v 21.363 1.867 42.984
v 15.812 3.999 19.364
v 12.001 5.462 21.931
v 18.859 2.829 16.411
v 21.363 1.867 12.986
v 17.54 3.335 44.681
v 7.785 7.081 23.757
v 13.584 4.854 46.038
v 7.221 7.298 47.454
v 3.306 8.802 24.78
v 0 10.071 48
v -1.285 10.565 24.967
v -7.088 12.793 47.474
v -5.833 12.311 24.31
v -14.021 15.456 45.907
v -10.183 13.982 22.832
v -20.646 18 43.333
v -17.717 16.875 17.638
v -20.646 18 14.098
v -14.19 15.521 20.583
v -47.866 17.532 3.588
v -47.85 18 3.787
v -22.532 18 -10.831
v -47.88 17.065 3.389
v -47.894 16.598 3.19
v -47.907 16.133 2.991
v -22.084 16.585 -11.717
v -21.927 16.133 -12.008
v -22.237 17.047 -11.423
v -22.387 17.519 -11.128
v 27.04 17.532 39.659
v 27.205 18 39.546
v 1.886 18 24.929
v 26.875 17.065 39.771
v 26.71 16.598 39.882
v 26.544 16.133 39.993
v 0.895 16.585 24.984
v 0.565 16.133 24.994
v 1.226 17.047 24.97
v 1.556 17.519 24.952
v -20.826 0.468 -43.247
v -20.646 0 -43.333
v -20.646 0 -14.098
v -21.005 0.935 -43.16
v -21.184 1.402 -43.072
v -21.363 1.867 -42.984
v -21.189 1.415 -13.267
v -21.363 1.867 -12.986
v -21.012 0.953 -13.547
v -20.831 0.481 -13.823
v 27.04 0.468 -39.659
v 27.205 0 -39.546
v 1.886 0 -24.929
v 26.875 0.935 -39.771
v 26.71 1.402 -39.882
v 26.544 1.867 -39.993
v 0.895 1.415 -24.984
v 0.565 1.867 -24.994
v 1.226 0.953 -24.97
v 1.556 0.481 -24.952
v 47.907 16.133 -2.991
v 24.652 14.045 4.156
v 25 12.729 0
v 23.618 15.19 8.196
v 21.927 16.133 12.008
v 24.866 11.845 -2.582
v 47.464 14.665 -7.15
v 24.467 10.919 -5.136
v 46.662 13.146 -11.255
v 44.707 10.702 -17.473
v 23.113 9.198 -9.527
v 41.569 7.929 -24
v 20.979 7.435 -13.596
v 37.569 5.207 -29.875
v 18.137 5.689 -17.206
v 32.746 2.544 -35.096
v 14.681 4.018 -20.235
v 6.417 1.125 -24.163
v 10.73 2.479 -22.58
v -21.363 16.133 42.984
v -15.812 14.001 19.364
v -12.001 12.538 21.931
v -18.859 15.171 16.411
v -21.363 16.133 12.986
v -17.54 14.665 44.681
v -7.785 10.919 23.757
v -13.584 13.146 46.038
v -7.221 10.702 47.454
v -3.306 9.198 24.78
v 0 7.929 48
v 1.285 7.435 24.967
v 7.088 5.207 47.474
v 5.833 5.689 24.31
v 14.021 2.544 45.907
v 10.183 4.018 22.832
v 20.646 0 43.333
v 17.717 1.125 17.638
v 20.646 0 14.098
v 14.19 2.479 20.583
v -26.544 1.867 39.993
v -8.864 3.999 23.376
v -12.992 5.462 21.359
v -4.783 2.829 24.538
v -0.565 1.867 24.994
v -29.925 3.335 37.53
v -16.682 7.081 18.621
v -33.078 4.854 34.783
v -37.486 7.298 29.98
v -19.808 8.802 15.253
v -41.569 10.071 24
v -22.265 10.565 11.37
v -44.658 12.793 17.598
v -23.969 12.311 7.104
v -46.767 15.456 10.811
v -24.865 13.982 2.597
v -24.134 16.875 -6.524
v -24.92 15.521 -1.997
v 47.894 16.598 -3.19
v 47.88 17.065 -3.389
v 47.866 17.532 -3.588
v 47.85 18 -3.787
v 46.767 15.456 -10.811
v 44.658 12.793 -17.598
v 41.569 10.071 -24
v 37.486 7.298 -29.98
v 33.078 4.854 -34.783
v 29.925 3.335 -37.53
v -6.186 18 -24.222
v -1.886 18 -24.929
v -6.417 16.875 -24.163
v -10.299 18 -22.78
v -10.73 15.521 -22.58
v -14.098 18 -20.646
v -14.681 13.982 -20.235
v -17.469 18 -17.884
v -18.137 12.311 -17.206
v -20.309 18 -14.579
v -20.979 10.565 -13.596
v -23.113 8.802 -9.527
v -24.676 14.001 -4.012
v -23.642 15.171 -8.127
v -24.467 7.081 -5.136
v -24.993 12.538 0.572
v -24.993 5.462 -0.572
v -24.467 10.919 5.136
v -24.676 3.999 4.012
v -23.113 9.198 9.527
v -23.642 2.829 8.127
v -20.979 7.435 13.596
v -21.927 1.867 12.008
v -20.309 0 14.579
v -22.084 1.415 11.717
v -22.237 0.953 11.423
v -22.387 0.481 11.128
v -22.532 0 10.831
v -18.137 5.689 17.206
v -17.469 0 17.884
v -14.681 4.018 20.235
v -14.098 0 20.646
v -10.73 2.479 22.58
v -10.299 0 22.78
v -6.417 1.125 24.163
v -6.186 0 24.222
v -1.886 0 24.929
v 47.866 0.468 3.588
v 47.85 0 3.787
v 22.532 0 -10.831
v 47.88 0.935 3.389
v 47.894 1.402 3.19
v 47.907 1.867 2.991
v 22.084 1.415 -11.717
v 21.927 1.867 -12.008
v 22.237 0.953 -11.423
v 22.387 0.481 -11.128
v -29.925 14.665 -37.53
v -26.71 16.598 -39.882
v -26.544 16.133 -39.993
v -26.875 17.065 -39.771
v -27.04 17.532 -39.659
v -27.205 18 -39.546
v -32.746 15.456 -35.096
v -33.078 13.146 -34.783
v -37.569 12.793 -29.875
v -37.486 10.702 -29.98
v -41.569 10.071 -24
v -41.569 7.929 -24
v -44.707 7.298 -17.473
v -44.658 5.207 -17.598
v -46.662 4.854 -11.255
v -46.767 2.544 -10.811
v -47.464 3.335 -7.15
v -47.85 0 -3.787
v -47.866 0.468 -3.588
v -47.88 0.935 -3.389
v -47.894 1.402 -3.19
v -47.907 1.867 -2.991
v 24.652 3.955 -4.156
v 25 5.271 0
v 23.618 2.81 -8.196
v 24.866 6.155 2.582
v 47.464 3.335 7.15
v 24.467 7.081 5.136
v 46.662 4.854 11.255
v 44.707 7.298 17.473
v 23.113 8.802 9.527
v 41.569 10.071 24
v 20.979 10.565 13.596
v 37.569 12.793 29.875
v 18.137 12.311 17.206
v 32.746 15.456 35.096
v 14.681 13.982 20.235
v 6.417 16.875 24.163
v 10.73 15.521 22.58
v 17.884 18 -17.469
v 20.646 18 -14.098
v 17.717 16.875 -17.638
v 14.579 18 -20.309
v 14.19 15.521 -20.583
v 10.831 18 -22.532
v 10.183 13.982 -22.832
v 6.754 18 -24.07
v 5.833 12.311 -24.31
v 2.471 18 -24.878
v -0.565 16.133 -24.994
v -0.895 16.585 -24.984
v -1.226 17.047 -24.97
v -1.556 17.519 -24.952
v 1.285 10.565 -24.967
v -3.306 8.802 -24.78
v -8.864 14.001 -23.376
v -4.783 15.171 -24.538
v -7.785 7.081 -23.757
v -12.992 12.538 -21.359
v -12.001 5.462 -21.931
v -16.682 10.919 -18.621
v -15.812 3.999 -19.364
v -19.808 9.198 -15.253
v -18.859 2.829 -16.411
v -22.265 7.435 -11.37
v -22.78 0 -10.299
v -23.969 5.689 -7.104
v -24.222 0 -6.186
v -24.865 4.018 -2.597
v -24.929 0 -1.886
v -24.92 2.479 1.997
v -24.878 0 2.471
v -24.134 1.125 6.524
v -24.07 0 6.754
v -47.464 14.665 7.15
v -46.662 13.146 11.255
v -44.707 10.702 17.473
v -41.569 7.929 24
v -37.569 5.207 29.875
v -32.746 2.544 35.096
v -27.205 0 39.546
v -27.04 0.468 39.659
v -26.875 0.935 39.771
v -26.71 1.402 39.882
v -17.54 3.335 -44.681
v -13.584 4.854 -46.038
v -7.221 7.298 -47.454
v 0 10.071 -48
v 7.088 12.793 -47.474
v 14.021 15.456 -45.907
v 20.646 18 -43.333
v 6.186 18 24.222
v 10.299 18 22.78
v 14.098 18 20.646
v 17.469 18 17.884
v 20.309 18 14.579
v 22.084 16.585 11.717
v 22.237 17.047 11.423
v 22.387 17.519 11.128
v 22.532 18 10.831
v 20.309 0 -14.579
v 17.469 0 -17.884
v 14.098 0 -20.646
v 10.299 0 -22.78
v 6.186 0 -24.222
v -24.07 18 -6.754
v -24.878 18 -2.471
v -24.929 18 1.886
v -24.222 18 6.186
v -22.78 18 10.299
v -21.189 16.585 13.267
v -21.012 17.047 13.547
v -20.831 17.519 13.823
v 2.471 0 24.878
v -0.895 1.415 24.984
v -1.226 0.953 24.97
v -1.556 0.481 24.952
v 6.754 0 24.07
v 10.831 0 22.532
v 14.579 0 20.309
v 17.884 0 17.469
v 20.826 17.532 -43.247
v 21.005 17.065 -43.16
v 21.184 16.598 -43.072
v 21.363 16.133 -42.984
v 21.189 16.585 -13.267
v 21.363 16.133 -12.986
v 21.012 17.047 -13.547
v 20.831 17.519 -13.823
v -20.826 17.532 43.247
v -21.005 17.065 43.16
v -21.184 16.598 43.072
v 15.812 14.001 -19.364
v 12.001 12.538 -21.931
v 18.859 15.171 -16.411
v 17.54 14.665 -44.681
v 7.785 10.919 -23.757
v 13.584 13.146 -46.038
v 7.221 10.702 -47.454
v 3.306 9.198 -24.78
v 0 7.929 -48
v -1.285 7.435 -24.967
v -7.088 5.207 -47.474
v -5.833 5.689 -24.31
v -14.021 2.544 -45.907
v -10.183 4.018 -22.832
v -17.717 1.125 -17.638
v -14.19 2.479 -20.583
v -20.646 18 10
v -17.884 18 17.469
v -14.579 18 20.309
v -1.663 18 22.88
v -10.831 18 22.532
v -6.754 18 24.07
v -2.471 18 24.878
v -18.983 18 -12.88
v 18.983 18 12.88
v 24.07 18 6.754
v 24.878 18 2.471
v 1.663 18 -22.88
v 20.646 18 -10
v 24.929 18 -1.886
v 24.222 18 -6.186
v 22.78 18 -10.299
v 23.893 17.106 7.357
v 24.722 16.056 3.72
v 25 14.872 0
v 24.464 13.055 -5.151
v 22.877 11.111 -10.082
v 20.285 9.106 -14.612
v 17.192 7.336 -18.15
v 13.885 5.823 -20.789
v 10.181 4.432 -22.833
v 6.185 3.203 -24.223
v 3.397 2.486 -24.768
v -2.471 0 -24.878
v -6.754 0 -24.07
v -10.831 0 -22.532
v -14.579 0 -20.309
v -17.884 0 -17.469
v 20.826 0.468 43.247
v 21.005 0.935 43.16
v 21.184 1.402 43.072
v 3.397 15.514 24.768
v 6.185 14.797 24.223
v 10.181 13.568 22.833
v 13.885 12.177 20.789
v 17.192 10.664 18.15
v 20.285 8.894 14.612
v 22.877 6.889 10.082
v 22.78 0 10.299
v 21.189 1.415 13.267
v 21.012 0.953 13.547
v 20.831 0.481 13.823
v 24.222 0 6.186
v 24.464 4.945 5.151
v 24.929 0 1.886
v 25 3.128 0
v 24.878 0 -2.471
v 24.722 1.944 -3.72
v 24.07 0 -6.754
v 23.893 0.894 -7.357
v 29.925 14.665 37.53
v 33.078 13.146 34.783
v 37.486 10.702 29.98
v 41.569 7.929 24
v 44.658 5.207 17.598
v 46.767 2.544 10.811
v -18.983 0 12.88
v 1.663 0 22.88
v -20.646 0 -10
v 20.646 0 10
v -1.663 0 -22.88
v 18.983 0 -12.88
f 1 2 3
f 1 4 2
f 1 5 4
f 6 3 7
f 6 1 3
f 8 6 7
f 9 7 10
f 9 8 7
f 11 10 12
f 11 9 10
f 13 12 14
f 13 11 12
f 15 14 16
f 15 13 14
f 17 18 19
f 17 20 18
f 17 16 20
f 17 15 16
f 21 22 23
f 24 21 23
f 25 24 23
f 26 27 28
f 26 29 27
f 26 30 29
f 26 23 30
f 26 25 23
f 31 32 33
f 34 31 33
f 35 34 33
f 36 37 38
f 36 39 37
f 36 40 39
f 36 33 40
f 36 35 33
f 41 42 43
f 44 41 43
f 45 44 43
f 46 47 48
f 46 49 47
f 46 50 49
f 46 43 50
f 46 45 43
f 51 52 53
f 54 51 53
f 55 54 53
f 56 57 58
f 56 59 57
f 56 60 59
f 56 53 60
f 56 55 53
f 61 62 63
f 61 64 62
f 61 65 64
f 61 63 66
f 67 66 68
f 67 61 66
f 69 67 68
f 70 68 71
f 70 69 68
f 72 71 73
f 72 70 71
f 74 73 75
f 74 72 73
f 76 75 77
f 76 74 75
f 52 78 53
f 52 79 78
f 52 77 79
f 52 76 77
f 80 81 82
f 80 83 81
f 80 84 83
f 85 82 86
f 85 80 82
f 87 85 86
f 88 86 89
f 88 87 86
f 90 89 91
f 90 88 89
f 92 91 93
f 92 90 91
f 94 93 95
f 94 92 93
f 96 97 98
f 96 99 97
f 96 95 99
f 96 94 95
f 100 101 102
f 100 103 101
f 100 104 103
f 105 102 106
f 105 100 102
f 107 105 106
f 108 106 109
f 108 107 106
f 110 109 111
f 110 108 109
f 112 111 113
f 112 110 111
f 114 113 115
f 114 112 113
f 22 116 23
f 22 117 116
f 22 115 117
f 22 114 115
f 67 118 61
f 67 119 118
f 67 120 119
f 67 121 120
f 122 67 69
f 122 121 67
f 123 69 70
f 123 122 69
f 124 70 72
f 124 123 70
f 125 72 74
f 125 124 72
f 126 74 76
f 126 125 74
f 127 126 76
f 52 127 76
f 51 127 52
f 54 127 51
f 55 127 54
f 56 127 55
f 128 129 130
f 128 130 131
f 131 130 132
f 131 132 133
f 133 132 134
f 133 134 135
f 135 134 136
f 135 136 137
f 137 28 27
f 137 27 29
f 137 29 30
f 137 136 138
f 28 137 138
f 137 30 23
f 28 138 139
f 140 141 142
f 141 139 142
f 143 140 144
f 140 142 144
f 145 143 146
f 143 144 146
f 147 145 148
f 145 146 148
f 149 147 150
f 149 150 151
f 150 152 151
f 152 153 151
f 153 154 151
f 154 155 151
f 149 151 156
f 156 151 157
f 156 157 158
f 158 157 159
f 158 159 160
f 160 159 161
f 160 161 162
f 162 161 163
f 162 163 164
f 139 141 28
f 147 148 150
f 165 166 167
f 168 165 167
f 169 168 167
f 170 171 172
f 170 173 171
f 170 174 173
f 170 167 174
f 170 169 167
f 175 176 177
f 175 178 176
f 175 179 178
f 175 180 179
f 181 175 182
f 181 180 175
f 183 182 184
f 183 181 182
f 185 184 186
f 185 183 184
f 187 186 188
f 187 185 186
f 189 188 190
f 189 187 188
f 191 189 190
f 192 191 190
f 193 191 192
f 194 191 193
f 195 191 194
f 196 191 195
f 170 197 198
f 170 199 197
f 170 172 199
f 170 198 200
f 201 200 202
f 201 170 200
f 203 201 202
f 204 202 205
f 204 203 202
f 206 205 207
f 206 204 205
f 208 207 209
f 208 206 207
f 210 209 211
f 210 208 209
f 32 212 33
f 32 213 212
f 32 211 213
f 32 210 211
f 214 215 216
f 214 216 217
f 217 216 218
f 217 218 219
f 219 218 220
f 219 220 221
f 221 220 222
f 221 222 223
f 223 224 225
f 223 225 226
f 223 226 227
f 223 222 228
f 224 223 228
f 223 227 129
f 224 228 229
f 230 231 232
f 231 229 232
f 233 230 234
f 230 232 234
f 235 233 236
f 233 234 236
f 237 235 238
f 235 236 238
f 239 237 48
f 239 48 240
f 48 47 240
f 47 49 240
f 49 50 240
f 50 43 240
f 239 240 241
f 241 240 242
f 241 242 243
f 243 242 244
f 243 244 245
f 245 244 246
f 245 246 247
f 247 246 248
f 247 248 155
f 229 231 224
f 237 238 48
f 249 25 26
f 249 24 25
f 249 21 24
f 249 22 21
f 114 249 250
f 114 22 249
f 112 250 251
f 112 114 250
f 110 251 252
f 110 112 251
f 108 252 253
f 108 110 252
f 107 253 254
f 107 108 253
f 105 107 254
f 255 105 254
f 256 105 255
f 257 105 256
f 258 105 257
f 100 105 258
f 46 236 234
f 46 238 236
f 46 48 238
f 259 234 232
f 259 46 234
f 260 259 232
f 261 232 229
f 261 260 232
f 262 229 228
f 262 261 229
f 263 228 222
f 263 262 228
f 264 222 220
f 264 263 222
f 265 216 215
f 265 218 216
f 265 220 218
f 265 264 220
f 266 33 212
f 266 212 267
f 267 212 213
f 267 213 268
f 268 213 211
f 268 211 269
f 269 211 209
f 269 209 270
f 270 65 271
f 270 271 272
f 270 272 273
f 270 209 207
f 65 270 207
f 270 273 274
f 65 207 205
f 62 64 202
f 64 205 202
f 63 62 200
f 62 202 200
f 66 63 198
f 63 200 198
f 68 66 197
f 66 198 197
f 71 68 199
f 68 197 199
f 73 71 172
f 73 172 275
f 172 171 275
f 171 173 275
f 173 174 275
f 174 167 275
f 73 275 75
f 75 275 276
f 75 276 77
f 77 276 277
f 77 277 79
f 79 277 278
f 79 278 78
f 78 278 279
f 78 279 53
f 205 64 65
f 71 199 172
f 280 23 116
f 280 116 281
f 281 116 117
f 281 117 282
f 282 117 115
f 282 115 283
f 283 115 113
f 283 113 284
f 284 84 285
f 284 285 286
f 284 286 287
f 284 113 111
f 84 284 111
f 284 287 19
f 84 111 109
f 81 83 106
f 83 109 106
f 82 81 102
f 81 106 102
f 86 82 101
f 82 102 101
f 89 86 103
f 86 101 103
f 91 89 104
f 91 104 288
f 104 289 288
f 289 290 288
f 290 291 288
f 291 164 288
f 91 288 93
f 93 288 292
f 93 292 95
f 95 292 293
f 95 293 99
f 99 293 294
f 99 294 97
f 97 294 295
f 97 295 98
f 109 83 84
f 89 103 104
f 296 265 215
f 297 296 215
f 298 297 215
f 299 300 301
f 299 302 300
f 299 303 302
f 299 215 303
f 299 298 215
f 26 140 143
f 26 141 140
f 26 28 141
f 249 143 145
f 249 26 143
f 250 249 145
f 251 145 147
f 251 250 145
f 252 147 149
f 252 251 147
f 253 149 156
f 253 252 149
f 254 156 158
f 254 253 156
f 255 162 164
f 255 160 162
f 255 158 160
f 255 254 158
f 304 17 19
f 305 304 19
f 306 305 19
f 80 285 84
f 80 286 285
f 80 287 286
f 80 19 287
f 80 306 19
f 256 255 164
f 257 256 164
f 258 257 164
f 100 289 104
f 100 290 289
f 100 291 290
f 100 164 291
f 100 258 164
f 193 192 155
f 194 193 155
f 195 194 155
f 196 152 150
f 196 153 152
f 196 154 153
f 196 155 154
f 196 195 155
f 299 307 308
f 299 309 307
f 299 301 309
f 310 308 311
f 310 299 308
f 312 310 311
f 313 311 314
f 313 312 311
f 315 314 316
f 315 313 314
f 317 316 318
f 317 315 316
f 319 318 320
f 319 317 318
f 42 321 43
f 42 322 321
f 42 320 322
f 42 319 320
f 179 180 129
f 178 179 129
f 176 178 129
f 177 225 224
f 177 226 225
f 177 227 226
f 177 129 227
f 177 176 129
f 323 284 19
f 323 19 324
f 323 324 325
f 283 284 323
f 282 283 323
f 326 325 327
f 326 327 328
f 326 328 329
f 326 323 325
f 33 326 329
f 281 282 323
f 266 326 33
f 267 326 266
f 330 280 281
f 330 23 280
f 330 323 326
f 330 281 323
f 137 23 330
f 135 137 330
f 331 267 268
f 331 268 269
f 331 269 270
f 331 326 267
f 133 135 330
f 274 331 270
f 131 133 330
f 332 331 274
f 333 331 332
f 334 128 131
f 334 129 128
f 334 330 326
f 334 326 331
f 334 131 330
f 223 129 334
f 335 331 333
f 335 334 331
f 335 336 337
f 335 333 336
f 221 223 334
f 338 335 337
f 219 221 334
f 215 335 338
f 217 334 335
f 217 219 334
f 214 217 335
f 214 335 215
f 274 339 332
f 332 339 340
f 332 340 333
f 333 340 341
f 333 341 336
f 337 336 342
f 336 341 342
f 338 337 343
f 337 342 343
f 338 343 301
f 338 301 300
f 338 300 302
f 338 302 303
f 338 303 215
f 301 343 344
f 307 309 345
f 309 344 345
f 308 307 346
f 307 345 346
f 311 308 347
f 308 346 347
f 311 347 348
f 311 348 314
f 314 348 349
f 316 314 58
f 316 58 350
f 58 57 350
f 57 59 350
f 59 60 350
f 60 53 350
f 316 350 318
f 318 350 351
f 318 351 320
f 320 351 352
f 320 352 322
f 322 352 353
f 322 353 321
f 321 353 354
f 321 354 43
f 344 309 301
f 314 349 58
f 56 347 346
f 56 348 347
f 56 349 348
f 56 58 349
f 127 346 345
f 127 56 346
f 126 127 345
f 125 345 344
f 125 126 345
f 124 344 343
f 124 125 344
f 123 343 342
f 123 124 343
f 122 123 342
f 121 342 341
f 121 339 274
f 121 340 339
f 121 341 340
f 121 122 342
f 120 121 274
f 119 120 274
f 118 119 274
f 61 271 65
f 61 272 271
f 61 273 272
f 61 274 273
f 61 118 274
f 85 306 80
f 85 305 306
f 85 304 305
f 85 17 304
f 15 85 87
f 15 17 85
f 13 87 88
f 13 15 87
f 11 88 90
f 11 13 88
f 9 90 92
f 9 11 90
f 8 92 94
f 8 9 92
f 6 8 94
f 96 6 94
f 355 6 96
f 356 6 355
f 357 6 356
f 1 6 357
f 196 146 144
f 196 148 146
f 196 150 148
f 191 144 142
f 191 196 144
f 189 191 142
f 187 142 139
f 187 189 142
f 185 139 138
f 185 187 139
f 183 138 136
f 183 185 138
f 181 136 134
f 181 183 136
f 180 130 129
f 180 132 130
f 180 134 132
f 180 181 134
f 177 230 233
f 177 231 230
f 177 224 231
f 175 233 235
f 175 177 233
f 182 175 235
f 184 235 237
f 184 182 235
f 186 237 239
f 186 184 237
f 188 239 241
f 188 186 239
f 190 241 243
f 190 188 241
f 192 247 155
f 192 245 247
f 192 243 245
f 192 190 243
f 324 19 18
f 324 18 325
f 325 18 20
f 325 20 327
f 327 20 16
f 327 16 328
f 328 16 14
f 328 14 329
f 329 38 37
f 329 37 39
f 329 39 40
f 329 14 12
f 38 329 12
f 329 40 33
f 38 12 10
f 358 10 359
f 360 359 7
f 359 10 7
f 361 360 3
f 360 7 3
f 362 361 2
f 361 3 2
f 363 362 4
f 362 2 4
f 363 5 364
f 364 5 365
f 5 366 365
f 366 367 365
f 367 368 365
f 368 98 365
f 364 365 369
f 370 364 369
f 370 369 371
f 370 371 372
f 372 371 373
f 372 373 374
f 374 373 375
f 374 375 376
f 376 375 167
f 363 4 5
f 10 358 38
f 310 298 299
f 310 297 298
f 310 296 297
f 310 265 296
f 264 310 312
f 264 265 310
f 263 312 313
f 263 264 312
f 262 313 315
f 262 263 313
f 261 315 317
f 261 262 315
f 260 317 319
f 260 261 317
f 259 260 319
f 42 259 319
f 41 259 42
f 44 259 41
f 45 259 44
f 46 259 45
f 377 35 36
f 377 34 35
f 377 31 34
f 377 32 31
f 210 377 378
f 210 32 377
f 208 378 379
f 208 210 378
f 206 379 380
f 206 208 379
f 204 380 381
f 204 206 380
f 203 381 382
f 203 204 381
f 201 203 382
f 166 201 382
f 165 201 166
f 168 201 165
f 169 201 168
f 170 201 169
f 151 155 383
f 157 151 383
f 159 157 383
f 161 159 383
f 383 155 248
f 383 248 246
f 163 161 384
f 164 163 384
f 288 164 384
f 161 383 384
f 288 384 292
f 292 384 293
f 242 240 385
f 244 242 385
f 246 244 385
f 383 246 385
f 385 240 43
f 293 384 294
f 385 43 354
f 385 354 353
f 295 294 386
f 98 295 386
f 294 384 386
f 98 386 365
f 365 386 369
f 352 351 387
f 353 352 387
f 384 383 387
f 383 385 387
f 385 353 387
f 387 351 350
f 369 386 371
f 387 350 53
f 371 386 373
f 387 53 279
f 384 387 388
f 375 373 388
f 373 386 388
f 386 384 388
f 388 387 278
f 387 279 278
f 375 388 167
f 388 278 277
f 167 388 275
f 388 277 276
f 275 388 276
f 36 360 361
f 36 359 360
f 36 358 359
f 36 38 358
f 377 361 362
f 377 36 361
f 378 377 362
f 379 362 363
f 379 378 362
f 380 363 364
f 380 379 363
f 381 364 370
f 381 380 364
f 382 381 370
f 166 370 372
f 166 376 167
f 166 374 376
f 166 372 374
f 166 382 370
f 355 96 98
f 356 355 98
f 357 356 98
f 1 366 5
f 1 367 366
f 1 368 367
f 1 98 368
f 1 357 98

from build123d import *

# Parameters (mm, degrees)
SKETCH1_R           = 25
BOSS_EXTRUDE1_DEPTH = 18
BOSS_EXTRUDE2_DEPTH = 38
CIRPATTERN1_COUNT   = 6
SKETCH4_R           = 55.206013126
SKETCH4_R_2         = 48
CUT_EXTRUDE2_DEPTH  = 38


with BuildPart() as part:
    # Sketch1 → Boss-Extrude1 (new body)
    with BuildSketch(Plane(origin=(0, 0, 0), x_dir=(1, 0, 0), z_dir=(0, 1, 0))):
        Circle(SKETCH1_R)
    extrude(amount=BOSS_EXTRUDE1_DEPTH)

    # Sketch3 → Boss-Extrude2 (add)
    with BuildSketch(Plane(origin=(0, 0, 48), x_dir=(-1, 0, 0), z_dir=(0, 0, -1))):
        Polygon((-21.362842742, 1.867051803), (20.645822822, 18), (21.362842742, 16.132948197), (-20.645822822, 0), align=None)
    boss_extrude2 = extrude(amount=BOSS_EXTRUDE2_DEPTH)

    # CirPattern1: Boss-Extrude2 ×6 about axis
    cirpattern1_axis = Axis((0, 0, 0), (0, 1, 0))
    for i in range(1, CIRPATTERN1_COUNT):
        add(boss_extrude2.rotate(cirpattern1_axis, i * 360 / CIRPATTERN1_COUNT))

    # Sketch4 → Cut-Extrude2 (cut)
    with BuildSketch(Plane(origin=(0, 18, 0), x_dir=(1, 0, 0), z_dir=(0, 1, 0))):
        Circle(SKETCH4_R)
        Circle(SKETCH4_R_2, mode=Mode.SUBTRACT)
    extrude(amount=-CUT_EXTRUDE2_DEPTH, mode=Mode.SUBTRACT)


solid = part.part
